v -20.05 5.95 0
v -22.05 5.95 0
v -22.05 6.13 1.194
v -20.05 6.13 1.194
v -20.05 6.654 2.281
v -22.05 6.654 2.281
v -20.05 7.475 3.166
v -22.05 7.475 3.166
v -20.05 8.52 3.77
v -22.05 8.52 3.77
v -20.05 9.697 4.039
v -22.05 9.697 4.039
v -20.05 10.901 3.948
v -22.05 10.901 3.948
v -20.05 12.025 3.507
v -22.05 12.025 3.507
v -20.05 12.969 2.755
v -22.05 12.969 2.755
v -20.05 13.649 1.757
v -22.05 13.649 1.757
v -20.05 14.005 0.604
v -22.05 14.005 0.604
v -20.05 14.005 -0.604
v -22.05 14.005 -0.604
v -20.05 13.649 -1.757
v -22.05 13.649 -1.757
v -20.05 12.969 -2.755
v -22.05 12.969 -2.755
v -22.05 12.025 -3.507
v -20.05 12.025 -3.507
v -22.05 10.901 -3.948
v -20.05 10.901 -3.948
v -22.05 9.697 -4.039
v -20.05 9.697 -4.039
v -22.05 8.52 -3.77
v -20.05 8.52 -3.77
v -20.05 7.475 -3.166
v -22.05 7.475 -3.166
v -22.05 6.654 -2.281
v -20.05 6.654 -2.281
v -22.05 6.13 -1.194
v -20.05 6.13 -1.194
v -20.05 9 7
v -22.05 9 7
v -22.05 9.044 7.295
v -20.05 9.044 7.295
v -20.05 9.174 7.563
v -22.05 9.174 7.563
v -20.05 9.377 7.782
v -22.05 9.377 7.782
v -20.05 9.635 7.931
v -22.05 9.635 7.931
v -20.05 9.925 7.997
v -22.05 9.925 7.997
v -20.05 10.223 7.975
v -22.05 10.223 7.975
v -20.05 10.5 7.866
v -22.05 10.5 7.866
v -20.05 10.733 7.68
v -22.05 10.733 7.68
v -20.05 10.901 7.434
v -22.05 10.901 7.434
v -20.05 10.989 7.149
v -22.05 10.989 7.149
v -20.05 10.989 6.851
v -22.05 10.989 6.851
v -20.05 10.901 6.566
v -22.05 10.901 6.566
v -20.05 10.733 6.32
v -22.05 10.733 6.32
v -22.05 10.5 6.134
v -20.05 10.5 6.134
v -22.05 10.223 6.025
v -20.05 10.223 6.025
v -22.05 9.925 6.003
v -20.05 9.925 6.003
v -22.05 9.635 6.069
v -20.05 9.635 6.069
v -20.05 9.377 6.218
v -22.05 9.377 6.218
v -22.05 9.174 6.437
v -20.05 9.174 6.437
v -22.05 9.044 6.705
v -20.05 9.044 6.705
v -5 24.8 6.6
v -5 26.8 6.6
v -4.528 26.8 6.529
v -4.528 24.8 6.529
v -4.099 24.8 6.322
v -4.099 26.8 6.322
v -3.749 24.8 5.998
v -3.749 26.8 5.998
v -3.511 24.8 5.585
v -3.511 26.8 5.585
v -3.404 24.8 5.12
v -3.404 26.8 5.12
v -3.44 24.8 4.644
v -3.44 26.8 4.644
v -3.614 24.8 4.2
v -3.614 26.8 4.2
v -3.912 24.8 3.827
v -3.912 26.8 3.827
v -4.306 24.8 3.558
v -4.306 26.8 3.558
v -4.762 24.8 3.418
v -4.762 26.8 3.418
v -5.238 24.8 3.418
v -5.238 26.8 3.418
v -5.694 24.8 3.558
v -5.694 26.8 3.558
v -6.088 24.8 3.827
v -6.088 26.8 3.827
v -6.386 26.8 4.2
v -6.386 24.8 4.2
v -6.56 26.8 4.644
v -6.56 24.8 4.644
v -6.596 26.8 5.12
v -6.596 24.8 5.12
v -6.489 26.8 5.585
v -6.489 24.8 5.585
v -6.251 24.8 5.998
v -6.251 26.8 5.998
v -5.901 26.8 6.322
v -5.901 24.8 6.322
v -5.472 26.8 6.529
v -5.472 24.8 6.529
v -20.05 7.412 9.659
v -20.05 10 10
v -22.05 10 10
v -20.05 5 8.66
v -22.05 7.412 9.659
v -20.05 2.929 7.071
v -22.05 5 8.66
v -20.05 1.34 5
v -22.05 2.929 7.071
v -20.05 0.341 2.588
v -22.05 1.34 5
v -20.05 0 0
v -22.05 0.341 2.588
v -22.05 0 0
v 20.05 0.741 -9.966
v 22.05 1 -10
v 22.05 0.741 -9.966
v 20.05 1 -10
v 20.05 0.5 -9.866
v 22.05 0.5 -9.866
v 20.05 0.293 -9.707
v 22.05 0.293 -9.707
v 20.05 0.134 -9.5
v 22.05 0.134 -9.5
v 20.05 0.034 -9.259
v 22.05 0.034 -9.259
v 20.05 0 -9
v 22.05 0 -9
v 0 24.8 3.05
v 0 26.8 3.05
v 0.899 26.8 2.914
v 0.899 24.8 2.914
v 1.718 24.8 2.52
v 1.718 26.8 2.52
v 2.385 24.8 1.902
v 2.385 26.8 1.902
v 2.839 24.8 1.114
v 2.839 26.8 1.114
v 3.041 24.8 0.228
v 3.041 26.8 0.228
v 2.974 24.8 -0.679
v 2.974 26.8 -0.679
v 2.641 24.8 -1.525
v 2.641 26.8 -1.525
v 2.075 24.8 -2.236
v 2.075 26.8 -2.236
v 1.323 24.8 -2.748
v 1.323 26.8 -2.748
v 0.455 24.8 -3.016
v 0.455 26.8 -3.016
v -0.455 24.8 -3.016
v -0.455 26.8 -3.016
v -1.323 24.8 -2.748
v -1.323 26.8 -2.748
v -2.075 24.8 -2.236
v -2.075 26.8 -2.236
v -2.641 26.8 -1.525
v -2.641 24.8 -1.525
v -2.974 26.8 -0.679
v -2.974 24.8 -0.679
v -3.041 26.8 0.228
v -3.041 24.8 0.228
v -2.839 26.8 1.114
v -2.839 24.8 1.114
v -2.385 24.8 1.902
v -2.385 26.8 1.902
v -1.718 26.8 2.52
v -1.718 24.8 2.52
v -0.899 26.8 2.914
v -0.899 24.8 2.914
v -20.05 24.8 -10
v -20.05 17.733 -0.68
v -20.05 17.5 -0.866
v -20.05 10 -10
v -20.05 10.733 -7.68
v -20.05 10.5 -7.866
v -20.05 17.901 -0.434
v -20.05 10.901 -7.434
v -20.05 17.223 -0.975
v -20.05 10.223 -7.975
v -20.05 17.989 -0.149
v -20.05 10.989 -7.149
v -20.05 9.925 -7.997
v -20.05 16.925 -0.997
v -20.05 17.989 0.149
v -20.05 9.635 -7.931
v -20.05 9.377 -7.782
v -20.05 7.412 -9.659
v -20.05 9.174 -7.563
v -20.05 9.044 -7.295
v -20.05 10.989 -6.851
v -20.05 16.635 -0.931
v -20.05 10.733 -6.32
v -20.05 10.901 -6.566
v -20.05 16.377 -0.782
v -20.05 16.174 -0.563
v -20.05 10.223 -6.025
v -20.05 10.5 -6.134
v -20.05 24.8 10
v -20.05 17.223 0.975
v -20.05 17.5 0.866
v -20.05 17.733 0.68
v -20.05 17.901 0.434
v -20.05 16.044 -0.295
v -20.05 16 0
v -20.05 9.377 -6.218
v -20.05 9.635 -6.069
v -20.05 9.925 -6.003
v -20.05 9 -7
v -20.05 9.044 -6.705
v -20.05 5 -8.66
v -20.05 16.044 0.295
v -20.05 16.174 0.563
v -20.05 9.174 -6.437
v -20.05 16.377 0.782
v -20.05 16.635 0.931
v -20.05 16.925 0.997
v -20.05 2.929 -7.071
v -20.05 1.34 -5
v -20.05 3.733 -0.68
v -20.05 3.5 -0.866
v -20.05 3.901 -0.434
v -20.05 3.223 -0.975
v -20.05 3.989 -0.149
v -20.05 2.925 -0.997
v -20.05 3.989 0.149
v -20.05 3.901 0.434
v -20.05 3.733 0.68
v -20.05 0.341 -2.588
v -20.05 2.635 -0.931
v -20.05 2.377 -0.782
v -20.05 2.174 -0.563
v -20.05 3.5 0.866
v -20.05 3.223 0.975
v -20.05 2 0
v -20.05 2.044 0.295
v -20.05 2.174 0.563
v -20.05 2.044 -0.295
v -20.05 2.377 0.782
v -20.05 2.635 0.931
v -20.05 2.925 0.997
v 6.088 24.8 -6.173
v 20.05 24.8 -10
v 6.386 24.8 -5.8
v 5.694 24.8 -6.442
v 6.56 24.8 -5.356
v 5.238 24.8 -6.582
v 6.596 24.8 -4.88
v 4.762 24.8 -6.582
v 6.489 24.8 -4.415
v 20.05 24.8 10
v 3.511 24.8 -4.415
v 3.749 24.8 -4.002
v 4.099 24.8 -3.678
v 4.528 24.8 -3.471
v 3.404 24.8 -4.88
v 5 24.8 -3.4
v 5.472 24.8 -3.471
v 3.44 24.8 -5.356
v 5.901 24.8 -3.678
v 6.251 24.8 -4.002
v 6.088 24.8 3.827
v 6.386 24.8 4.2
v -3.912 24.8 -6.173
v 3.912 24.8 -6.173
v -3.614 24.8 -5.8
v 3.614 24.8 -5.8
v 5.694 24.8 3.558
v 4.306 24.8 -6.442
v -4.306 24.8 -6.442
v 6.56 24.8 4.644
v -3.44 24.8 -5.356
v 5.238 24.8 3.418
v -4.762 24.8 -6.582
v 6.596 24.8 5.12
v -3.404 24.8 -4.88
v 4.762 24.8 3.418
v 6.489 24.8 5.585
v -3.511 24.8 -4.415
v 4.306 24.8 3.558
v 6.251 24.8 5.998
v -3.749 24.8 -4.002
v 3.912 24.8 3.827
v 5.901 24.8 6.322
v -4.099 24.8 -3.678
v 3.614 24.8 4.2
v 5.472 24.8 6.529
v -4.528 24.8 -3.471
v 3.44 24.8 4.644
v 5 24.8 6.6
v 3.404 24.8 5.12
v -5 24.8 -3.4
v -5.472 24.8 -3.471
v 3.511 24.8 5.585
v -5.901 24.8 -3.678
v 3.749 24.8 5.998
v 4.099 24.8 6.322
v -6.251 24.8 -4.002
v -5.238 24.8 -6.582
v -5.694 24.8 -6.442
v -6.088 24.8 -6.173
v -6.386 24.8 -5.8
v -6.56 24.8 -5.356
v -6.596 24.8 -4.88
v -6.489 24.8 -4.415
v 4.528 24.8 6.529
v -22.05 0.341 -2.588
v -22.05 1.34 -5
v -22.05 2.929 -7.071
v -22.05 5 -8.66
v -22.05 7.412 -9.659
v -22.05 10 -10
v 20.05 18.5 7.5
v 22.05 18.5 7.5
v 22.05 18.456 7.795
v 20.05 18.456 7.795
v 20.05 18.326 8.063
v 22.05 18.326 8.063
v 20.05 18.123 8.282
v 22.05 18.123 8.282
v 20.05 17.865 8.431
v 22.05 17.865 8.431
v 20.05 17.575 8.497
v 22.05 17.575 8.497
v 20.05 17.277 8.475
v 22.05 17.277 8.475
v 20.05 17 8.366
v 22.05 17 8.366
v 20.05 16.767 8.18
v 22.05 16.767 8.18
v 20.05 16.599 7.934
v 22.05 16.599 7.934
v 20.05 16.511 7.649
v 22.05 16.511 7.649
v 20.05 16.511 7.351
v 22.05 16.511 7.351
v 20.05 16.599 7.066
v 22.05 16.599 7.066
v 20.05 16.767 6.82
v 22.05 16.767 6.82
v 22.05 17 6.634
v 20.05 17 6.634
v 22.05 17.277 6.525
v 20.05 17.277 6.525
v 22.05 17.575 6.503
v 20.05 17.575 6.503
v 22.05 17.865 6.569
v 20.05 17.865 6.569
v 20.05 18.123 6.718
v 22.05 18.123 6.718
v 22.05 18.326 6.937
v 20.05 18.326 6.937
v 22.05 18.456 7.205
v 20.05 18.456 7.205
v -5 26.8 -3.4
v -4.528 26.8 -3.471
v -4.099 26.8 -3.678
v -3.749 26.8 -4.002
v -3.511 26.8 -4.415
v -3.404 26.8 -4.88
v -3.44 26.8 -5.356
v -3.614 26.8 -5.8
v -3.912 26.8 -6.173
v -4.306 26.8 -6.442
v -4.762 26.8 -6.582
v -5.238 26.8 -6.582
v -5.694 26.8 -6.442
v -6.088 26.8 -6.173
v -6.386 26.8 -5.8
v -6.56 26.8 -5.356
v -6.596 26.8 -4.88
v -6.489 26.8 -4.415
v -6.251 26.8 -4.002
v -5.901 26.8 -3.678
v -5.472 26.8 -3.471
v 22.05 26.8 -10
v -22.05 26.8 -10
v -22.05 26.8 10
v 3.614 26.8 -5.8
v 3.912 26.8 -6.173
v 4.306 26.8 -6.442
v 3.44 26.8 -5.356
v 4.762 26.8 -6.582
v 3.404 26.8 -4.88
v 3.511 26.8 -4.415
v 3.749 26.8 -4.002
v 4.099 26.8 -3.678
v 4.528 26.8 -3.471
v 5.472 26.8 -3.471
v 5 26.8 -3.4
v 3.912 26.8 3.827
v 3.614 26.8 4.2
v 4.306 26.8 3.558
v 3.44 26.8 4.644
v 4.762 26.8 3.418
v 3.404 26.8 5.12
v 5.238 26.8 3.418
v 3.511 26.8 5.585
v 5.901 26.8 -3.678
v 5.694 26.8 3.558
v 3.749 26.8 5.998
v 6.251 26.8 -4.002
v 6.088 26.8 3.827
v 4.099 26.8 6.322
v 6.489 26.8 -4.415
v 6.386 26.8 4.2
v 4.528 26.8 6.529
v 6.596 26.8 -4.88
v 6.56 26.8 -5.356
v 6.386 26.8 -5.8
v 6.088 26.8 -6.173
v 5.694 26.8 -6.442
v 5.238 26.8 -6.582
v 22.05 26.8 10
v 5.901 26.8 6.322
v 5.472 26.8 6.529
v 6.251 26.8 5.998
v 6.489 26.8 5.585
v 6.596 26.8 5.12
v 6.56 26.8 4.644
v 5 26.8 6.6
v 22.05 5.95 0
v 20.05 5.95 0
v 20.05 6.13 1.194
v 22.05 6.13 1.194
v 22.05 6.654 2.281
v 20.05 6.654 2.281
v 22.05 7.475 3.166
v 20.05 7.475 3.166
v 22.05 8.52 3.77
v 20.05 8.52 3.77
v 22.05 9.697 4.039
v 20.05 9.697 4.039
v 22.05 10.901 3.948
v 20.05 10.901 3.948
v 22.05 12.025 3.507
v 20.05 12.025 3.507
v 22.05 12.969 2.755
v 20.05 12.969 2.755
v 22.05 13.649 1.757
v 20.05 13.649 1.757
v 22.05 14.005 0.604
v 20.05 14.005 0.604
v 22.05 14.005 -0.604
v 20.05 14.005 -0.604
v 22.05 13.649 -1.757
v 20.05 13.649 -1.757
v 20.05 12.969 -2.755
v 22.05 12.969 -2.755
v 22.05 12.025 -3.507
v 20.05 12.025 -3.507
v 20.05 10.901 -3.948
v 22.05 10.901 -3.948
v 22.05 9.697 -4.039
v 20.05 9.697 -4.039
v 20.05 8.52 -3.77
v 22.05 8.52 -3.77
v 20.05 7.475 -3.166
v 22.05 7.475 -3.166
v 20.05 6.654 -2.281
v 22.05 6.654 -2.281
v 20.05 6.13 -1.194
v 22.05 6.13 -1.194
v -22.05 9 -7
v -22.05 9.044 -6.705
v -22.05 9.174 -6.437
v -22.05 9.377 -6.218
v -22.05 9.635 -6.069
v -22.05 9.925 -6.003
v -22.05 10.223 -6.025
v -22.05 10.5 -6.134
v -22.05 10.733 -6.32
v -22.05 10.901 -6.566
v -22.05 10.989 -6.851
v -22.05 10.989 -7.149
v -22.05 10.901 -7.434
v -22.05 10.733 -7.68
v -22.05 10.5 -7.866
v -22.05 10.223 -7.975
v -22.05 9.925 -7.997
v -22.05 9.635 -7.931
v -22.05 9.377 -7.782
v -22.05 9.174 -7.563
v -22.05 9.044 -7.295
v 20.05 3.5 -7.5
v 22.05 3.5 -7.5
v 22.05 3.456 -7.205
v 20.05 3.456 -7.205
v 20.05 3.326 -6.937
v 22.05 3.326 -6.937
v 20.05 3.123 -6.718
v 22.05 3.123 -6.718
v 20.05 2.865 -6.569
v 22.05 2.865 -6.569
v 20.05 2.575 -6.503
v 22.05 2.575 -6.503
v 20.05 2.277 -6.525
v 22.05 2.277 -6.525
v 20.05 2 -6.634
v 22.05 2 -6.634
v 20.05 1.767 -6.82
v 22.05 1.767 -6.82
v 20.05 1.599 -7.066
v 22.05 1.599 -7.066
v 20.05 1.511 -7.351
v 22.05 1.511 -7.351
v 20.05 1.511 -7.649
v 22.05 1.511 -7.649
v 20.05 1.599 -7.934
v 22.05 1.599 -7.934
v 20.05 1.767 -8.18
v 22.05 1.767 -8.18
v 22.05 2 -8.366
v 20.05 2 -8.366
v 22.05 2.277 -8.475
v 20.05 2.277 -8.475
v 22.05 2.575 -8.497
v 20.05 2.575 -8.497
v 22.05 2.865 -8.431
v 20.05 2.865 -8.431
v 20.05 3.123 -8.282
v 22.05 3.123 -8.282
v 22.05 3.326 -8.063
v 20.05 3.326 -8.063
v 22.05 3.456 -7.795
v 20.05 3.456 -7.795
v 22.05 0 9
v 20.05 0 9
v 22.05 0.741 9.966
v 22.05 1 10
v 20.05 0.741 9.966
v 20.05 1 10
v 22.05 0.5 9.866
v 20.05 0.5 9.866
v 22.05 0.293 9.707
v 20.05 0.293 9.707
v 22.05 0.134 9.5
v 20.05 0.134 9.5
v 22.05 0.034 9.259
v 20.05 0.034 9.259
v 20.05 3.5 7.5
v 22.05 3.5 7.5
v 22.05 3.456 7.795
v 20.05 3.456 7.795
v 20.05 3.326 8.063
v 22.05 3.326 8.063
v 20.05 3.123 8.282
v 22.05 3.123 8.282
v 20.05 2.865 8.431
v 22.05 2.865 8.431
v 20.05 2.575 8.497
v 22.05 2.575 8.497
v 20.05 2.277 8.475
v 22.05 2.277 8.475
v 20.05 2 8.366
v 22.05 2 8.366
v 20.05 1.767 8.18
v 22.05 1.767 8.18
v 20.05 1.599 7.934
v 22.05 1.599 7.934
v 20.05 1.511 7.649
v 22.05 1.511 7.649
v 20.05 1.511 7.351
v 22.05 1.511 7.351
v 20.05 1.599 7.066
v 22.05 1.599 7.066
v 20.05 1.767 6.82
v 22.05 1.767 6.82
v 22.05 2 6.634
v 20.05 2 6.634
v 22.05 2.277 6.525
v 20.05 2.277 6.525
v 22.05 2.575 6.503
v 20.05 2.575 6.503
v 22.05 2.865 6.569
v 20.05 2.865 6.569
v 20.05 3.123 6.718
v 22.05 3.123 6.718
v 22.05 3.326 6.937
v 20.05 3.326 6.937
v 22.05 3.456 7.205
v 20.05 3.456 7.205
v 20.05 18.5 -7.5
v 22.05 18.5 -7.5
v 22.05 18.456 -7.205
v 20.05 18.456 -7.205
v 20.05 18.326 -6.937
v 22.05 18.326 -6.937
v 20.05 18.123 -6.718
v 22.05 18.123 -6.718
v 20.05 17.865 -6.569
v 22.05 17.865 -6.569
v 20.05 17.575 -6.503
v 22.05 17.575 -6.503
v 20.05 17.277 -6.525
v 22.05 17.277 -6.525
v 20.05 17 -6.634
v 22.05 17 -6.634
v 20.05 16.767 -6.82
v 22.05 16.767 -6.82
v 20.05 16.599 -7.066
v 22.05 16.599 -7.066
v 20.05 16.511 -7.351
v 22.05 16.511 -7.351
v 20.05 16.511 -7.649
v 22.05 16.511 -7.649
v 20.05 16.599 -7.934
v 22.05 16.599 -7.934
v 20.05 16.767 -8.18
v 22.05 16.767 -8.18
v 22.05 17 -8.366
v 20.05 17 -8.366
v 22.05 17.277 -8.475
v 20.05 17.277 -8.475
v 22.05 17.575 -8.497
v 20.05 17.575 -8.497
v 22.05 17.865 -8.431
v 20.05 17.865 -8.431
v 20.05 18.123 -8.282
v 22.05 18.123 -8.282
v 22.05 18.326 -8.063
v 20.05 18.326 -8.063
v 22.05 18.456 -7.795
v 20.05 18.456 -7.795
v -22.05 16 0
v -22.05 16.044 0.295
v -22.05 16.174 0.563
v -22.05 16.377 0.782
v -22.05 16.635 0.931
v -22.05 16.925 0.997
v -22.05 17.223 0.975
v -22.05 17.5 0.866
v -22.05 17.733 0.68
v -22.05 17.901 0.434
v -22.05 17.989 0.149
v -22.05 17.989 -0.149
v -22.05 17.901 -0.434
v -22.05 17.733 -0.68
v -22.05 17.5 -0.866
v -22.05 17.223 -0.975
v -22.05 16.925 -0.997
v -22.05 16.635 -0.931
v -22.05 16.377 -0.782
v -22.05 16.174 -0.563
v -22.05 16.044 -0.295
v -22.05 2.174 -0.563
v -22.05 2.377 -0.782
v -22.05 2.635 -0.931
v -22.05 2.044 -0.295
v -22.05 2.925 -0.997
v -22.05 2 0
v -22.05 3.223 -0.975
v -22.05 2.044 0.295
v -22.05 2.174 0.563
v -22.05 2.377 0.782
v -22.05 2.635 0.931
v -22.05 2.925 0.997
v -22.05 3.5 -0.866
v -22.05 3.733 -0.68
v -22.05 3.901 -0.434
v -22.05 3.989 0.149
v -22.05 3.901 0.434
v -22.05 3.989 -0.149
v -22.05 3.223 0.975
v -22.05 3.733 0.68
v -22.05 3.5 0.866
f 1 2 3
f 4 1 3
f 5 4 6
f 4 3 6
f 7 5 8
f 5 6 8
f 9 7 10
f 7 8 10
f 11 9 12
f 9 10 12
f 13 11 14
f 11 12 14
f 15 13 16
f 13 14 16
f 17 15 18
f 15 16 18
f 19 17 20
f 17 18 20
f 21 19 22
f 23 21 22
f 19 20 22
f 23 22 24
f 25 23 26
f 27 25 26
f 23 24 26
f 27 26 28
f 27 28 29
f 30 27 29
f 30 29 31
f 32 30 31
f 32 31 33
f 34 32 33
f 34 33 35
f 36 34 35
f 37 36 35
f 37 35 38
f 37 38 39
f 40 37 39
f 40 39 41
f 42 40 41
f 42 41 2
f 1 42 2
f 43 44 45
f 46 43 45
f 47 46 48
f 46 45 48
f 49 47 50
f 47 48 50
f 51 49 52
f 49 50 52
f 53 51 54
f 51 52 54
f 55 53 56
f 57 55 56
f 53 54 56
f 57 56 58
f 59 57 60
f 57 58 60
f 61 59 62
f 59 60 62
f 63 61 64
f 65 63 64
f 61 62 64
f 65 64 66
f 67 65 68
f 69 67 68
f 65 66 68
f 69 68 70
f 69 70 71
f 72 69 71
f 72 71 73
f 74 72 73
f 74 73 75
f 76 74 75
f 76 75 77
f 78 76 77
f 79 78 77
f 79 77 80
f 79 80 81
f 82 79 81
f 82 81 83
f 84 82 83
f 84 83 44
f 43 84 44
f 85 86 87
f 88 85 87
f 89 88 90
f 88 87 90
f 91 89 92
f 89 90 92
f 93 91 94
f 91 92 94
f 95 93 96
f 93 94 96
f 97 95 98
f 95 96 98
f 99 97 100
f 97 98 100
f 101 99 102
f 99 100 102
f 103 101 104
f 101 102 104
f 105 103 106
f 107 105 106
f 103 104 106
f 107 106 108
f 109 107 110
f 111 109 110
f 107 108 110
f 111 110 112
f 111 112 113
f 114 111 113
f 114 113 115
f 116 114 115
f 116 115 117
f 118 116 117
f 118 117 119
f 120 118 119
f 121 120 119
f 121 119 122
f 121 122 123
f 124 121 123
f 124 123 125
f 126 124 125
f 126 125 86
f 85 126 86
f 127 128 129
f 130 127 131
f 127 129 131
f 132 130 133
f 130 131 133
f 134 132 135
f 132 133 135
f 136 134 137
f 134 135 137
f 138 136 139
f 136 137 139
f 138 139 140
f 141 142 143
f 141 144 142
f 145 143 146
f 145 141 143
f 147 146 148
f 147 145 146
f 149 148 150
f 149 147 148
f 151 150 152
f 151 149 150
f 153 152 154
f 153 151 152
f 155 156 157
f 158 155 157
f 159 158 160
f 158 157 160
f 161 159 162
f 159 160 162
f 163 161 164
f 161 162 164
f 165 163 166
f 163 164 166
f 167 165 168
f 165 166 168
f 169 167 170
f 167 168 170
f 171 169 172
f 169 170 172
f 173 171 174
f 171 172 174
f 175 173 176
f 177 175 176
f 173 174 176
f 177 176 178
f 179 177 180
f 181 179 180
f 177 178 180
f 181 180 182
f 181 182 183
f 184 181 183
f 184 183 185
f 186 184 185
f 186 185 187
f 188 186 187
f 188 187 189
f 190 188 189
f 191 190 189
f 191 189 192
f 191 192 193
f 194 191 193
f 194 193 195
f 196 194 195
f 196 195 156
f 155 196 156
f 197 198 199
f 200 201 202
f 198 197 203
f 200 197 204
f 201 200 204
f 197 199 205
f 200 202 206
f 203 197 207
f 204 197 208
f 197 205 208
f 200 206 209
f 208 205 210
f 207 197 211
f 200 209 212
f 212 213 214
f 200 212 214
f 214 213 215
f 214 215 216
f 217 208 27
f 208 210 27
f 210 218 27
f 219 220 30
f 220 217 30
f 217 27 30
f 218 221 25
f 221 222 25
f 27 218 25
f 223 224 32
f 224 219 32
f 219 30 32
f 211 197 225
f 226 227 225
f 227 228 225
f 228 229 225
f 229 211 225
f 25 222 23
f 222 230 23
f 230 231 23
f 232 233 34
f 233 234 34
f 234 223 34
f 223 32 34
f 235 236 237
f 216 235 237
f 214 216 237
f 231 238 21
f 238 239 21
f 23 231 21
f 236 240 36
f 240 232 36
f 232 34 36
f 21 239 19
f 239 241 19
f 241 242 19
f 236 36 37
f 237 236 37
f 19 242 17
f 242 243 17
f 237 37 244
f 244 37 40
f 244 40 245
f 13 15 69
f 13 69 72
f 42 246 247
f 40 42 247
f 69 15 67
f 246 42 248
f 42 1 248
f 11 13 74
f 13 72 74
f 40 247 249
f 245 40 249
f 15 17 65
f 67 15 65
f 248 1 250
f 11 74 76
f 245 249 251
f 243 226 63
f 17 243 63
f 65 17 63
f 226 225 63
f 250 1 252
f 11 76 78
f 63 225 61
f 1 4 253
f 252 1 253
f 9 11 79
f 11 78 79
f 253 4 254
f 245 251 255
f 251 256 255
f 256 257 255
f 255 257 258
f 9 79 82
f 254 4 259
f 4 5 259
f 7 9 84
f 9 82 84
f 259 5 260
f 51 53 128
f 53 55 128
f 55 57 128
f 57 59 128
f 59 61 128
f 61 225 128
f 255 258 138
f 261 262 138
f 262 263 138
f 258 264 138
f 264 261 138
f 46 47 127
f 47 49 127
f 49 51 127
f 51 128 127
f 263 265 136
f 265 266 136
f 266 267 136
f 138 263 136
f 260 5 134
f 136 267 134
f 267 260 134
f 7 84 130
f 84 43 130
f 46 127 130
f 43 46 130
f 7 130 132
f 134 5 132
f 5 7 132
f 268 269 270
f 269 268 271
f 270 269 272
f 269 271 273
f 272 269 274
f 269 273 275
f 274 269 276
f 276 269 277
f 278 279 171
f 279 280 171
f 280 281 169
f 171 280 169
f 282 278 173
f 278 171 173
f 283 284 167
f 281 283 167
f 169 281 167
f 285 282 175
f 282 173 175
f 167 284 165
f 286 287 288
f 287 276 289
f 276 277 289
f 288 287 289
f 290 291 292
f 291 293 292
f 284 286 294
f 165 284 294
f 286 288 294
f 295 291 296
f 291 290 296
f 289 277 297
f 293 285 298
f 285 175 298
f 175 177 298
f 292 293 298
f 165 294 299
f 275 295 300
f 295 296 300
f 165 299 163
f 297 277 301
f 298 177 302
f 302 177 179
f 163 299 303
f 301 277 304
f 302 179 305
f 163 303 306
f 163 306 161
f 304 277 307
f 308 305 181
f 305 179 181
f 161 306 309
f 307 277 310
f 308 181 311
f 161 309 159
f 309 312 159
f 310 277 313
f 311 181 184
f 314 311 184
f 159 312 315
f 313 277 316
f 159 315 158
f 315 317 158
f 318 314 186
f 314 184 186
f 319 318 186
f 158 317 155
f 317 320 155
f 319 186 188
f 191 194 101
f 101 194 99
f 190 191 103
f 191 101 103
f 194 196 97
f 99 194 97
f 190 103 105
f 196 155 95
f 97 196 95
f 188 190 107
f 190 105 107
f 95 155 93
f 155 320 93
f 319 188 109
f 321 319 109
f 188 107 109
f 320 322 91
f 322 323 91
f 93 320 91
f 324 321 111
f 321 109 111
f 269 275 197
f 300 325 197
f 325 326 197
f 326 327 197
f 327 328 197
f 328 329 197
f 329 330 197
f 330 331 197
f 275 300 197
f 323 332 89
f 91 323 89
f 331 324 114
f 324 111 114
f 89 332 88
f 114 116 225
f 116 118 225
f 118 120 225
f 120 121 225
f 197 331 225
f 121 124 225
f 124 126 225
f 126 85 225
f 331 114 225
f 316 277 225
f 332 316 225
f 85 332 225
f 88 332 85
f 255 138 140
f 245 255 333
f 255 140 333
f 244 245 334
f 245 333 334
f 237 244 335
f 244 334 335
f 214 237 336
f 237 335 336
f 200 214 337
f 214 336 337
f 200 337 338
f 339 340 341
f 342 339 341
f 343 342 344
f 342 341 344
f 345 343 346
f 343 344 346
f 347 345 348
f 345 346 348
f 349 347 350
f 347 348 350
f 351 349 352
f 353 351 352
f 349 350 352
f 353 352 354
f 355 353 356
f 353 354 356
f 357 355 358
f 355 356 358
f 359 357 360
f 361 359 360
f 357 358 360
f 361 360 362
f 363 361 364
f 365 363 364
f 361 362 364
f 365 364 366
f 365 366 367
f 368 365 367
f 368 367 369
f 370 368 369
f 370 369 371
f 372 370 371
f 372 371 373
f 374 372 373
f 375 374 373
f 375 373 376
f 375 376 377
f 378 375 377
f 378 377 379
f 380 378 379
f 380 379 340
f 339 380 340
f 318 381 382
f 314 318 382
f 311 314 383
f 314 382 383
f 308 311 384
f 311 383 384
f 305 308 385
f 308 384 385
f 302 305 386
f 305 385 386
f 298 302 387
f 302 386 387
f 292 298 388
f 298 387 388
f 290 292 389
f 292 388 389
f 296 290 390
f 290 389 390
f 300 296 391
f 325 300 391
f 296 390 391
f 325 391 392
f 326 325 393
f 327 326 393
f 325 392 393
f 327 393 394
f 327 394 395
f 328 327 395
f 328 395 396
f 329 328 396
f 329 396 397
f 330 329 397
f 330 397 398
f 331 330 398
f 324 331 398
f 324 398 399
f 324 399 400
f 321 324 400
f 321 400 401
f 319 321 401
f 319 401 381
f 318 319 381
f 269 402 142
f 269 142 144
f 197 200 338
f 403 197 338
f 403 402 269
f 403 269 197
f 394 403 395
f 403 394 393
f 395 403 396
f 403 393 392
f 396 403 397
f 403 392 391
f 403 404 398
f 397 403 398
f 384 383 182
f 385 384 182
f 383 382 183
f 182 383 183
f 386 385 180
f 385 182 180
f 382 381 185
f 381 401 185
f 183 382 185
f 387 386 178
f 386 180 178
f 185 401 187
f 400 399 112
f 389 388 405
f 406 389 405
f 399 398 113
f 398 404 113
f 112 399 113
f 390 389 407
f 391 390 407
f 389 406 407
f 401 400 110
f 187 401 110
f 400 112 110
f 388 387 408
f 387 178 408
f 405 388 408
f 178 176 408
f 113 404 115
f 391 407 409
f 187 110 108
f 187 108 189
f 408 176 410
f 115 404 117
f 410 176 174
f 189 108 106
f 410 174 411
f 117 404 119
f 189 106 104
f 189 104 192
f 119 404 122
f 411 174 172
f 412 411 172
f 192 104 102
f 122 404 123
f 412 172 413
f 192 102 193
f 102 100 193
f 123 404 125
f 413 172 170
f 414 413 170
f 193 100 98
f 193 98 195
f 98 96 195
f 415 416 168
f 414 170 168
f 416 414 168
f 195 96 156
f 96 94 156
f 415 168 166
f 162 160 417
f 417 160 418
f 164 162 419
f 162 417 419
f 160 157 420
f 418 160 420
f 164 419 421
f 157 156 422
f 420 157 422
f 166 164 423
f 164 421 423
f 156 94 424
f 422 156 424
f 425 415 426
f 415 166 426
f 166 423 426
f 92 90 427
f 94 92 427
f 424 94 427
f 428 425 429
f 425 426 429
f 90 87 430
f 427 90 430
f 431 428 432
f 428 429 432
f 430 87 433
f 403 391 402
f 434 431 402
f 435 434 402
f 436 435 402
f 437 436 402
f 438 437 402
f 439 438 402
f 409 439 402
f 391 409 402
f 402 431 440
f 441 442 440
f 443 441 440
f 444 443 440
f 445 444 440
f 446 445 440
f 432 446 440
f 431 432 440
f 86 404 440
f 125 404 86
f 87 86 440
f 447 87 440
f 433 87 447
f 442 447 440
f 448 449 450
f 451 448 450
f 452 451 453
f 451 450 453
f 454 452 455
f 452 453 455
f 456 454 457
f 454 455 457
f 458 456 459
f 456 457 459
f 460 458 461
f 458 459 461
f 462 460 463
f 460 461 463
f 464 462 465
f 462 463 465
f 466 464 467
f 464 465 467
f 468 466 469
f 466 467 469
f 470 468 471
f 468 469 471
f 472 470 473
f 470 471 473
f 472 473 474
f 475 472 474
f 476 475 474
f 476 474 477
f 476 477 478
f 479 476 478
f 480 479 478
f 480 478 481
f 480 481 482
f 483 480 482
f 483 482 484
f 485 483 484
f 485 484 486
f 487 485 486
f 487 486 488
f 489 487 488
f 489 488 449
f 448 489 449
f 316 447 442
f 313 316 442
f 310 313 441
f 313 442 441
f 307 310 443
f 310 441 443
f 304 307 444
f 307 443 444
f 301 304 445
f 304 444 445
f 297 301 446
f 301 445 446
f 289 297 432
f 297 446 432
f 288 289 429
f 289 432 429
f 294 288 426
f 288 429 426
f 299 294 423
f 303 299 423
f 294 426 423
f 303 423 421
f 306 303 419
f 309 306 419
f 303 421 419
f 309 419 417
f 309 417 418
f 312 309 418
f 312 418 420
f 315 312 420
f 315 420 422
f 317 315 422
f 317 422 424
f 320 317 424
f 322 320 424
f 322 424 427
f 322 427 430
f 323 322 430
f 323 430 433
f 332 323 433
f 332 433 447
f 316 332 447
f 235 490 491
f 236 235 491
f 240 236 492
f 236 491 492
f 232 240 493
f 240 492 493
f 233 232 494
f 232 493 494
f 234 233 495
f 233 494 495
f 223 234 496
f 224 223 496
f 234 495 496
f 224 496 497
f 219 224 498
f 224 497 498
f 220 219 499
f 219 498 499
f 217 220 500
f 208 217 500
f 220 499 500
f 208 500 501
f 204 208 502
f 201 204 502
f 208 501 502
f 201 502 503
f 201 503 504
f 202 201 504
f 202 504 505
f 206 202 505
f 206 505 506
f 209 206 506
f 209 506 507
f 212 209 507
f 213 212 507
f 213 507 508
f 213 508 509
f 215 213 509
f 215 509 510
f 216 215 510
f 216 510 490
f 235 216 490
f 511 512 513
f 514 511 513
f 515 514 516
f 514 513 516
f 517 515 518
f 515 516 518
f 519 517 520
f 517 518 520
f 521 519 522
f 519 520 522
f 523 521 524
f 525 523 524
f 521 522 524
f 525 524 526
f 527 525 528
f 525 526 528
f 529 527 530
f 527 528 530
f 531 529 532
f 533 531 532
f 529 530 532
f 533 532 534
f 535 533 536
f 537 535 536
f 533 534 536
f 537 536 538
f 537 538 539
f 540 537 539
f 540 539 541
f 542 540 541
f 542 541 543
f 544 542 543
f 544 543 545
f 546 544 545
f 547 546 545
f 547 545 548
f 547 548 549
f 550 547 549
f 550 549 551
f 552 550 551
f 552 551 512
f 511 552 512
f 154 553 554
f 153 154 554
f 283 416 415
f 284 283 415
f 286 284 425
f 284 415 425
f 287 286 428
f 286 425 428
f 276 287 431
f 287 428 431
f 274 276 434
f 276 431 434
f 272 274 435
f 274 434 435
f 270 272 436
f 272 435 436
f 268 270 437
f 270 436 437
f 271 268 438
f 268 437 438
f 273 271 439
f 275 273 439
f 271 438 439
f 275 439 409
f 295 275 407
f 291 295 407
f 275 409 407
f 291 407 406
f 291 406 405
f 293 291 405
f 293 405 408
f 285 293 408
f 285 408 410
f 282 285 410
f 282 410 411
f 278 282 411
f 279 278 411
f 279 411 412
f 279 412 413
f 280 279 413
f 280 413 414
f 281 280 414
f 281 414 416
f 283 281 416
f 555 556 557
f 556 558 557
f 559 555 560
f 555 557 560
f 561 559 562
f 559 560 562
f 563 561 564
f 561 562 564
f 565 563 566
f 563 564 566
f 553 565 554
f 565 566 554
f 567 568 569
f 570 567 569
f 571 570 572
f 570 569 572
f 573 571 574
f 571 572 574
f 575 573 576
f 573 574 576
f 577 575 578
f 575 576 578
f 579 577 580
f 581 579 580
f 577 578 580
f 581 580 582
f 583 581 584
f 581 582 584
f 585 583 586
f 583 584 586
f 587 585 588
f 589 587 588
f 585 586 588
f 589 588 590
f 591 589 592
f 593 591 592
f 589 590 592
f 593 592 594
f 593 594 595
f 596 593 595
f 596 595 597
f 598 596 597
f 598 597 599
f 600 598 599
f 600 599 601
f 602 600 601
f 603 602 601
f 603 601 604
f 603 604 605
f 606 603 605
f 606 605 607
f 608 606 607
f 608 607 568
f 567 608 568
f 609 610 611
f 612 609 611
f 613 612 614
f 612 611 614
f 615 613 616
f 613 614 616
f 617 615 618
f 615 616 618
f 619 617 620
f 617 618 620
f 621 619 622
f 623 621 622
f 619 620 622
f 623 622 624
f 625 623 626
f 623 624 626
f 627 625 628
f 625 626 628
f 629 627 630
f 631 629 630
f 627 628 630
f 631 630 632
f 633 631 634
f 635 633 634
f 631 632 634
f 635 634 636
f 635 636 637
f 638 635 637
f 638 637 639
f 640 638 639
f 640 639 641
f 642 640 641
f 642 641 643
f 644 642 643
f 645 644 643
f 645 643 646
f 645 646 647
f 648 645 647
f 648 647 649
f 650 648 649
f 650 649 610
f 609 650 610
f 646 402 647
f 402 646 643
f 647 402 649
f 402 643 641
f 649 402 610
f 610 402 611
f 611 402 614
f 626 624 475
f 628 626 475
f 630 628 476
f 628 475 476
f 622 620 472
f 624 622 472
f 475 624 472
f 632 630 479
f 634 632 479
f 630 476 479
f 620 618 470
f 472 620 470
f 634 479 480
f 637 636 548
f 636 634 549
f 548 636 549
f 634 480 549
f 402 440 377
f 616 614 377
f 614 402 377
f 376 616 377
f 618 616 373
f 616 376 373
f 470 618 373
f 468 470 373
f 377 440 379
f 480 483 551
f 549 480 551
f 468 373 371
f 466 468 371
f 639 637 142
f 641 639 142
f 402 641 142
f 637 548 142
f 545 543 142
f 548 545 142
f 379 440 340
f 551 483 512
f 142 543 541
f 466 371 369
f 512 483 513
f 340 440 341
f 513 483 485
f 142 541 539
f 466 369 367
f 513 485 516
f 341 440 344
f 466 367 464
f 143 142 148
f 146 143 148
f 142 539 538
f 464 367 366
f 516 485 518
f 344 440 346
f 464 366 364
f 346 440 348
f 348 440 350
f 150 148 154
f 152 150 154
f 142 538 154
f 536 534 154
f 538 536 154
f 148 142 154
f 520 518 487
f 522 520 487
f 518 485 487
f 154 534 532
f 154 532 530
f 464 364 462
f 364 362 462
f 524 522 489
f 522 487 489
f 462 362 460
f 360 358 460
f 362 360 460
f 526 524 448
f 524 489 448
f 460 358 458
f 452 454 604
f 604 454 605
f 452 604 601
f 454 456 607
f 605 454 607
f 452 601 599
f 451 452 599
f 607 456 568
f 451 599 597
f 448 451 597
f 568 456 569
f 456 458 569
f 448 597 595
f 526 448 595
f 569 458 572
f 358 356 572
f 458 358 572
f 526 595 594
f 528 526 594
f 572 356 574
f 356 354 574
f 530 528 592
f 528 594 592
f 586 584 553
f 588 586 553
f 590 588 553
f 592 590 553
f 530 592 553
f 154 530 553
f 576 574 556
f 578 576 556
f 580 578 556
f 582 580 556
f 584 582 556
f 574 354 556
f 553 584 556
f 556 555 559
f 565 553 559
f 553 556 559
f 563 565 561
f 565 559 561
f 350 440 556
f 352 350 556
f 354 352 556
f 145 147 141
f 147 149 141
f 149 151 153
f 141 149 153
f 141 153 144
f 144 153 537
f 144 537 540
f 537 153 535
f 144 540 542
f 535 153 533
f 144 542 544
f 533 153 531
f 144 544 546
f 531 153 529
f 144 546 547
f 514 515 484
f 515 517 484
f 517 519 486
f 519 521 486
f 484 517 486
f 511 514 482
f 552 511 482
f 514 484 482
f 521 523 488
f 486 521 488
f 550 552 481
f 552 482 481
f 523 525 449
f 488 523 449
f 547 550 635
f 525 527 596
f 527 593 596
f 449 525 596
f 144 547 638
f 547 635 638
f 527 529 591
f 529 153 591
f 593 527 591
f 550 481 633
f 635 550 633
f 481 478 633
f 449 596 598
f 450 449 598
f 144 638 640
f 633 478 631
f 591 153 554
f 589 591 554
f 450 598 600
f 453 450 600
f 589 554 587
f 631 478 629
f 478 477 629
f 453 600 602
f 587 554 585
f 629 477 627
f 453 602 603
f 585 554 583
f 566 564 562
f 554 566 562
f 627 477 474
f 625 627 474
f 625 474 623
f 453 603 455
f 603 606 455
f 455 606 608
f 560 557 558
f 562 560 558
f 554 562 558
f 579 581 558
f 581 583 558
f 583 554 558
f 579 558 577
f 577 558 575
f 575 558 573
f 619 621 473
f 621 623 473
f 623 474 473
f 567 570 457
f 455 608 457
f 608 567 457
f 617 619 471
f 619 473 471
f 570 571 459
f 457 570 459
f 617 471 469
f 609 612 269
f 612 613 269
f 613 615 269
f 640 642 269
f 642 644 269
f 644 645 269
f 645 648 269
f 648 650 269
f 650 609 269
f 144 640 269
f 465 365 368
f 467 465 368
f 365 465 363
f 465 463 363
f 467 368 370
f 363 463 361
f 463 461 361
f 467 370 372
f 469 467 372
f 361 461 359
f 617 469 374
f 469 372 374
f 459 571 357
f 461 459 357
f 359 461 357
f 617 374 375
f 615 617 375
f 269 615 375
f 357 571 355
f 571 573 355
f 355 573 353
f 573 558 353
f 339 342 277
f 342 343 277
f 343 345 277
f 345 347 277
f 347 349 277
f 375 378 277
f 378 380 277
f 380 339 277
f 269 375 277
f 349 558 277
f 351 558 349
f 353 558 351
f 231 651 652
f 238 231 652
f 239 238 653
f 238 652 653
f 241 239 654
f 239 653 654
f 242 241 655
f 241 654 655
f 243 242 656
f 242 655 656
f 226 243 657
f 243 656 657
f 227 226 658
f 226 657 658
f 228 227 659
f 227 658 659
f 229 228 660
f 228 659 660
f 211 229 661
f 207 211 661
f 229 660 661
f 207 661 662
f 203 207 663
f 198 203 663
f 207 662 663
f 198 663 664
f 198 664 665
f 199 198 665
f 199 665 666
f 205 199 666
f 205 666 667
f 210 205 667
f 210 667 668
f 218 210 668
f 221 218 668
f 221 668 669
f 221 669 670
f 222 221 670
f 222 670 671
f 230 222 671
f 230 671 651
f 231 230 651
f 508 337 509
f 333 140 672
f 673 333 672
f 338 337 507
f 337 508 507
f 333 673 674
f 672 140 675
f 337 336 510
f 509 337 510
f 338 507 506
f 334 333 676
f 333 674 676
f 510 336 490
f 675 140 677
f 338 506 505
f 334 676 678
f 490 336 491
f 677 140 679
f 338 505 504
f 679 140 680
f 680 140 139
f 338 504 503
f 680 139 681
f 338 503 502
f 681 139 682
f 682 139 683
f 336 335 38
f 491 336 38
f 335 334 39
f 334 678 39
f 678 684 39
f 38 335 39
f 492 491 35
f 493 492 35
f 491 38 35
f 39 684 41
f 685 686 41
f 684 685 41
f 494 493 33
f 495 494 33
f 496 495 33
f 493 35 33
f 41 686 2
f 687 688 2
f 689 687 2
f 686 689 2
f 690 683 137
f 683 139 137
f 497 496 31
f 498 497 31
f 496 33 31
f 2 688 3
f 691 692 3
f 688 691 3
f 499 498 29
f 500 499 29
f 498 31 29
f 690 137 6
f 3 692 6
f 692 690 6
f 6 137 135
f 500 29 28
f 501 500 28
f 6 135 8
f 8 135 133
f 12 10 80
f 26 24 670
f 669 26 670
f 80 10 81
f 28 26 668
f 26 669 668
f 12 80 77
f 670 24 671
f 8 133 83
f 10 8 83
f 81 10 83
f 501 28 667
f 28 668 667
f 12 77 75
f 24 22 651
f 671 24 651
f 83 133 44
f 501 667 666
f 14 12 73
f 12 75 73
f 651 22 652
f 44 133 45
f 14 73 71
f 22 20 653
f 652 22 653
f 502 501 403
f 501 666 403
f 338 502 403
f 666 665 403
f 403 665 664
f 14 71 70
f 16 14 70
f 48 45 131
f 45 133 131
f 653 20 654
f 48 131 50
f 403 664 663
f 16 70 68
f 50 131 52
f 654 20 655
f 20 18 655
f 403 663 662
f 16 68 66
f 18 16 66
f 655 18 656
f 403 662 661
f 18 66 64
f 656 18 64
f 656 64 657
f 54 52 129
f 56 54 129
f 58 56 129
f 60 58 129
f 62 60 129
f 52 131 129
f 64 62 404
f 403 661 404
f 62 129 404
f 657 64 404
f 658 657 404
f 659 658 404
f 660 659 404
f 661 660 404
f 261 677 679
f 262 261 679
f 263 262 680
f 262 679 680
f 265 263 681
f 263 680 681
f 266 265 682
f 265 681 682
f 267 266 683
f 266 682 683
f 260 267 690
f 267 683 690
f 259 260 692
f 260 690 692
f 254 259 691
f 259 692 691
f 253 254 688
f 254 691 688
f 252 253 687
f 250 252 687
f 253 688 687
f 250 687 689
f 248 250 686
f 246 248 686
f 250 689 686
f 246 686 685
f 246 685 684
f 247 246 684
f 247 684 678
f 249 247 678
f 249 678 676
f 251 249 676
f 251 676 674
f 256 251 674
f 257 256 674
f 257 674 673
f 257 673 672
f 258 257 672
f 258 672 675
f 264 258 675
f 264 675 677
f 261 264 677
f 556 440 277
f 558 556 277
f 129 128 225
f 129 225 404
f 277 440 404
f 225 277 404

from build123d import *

# Parameters (mm, degrees)
BOSS_EXTRU_1_DEPTH                  = 10
ESQUISSE6_R                         = 3.05
ESQUISSE6_R_2                       = 1.6
ENL_V_MAT_EXTRU_4_DEPTH             = 37.117066603
ENL_V_MAT_EXTRU_1_REACH             = 54.565
ENL_V_MAT_EXTRU_1_DIRECTION_2_DEPTH = 53.56472201
ESQUISSE4_R                         = 4.05
ENL_V_MAT_EXTRU_2_DEPTH             = 53.56472201
ENL_V_MAT_EXTRU_3_REACH             = 54.565
ESQUISSE5_R                         = 1
ENL_V_MAT_EXTRU_5_REACH             = 54.565
ESQUISSE7_R                         = 1
CONG_1_R                            = 1


with BuildPart() as part:
    # Esquisse1 → Boss.-Extru.1 (new, symmetric)
    with BuildSketch(Plane.XY):
        Polygon((-22.05, 26.8), (22.05, 26.8), (22.05, 0), (20.05, 0), (20.05, 24.8), (-20.05, 24.8), (-20.05, 0), (-22.05, 0), align=None)
    extrude(amount=BOSS_EXTRU_1_DEPTH, both=True)

    # Esquisse6 → Enlèv. mat.-Extru.4 (cut, through all)
    with BuildSketch(Plane(origin=(0, 26.8, 0), x_dir=(1, 0, 0), z_dir=(0, 1, 0))):
        with Locations(Location((0, 0, 0), (0, 0, 270))):
            Circle(ESQUISSE6_R)
        with Locations(Location((-5, 5, 0), (0, 0, 270))):
            Circle(ESQUISSE6_R_2)
        with Locations(Location((5, 5, 0), (0, 0, 270))):
            Circle(ESQUISSE6_R_2)
        with Locations(Location((5, -5, 0), (0, 0, 270))):
            Circle(ESQUISSE6_R_2)
        with Locations(Location((-5, -5, 0), (0, 0, 270))):
            Circle(ESQUISSE6_R_2)
    extrude(amount=-ENL_V_MAT_EXTRU_4_DEPTH, mode=Mode.SUBTRACT)

    # Esquisse3 → Enlèv. mat.-Extru.1 (cut, up to next)
    with BuildSketch(Plane.ZY.offset(22.05), mode=Mode.PRIVATE) as enl_v_mat_extru_1_sk1:
        with BuildLine():
            ThreePointArc((0, 0), (-7.071067812, 2.928932188), (-10, 10))
            Line((-10, 10), (-10, 0))
            Line((-10, 0), (0, 0))
        make_face()
    enl_v_mat_extru_1_tool1 = extrude(enl_v_mat_extru_1_sk1.sketch, amount=-ENL_V_MAT_EXTRU_1_REACH, mode=Mode.PRIVATE) & part.part
    # Esquisse3 → Enlèv. mat.-Extru.1 (cut, up to next)
    with BuildSketch(Plane.ZY.offset(22.05), mode=Mode.PRIVATE) as enl_v_mat_extru_1_sk2:
        with BuildLine():
            ThreePointArc((10, 10), (7.071067812, 2.928932188), (0, 0))
            Line((0, 0), (10, 0))
            Line((10, 0), (10, 10))
        make_face()
    enl_v_mat_extru_1_tool2 = extrude(enl_v_mat_extru_1_sk2.sketch, amount=-ENL_V_MAT_EXTRU_1_REACH, mode=Mode.PRIVATE) & part.part
    add(enl_v_mat_extru_1_tool1.solids().sort_by_distance((-22.05, 2.233679, -7.766321))[0], mode=Mode.SUBTRACT)
    add(enl_v_mat_extru_1_tool2.solids().sort_by_distance((-22.05, 2.233679, 7.766321))[0], mode=Mode.SUBTRACT)

    # Esquisse3 → Enlèv. mat.-Extru.1 direction 2 (cut)
    with BuildSketch(Plane.ZY.offset(22.05)):
        with BuildLine():
            ThreePointArc((0, 0), (-7.071067812, 2.928932188), (-10, 10))
            Line((-10, 10), (-10, 0))
            Line((-10, 0), (0, 0))
        make_face()
        with BuildLine():
            ThreePointArc((10, 10), (7.071067812, 2.928932188), (0, 0))
            Line((0, 0), (10, 0))
            Line((10, 0), (10, 10))
        make_face()
    extrude(amount=ENL_V_MAT_EXTRU_1_DIRECTION_2_DEPTH, mode=Mode.SUBTRACT)

    # Esquisse4 → Enlèv. mat.-Extru.2 (cut, through all)
    with BuildSketch(Plane.ZY.offset(22.05)):
        with Locations(Location((0, 10, 0), (0, 0, 270))):
            Circle(ESQUISSE4_R)
    extrude(amount=-ENL_V_MAT_EXTRU_2_DEPTH, mode=Mode.SUBTRACT)

    # Esquisse5 → Enlèv. mat.-Extru.3 (cut, up to next)
    with BuildSketch(Plane.ZY.offset(22.05), mode=Mode.PRIVATE) as enl_v_mat_extru_3_sk1:
        with Locations(Location((-7, 10, 0), (0, 0, 270))):
            Circle(ESQUISSE5_R)
    enl_v_mat_extru_3_tool1 = extrude(enl_v_mat_extru_3_sk1.sketch, amount=-ENL_V_MAT_EXTRU_3_REACH, mode=Mode.PRIVATE) & part.part
    # Esquisse5 → Enlèv. mat.-Extru.3 (cut, up to next)
    with BuildSketch(Plane.ZY.offset(22.05), mode=Mode.PRIVATE) as enl_v_mat_extru_3_sk2:
        with Locations(Location((0, 17, 0), (0, 0, 270))):
            Circle(ESQUISSE5_R)
    enl_v_mat_extru_3_tool2 = extrude(enl_v_mat_extru_3_sk2.sketch, amount=-ENL_V_MAT_EXTRU_3_REACH, mode=Mode.PRIVATE) & part.part
    # Esquisse5 → Enlèv. mat.-Extru.3 (cut, up to next)
    with BuildSketch(Plane.ZY.offset(22.05), mode=Mode.PRIVATE) as enl_v_mat_extru_3_sk3:
        with Locations(Location((7, 10, 0), (0, 0, 270))):
            Circle(ESQUISSE5_R)
    enl_v_mat_extru_3_tool3 = extrude(enl_v_mat_extru_3_sk3.sketch, amount=-ENL_V_MAT_EXTRU_3_REACH, mode=Mode.PRIVATE) & part.part
    # Esquisse5 → Enlèv. mat.-Extru.3 (cut, up to next)
    with BuildSketch(Plane.ZY.offset(22.05), mode=Mode.PRIVATE) as enl_v_mat_extru_3_sk4:
        with Locations(Location((0, 3, 0), (0, 0, 270))):
            Circle(ESQUISSE5_R)
    enl_v_mat_extru_3_tool4 = extrude(enl_v_mat_extru_3_sk4.sketch, amount=-ENL_V_MAT_EXTRU_3_REACH, mode=Mode.PRIVATE) & part.part
    add(enl_v_mat_extru_3_tool1.solids().sort_by_distance((-22.05, 10, -7))[0], mode=Mode.SUBTRACT)
    add(enl_v_mat_extru_3_tool2.solids().sort_by_distance((-22.05, 17, 0))[0], mode=Mode.SUBTRACT)
    add(enl_v_mat_extru_3_tool3.solids().sort_by_distance((-22.05, 10, 7))[0], mode=Mode.SUBTRACT)
    add(enl_v_mat_extru_3_tool4.solids().sort_by_distance((-22.05, 3, 0))[0], mode=Mode.SUBTRACT)

    # Esquisse7 → Enlèv. mat.-Extru.5 (cut, up to next)
    with BuildSketch(Plane(origin=(22.05, 0, 0), x_dir=(0, 0, -1), z_dir=(1, 0, 0)), mode=Mode.PRIVATE) as enl_v_mat_extru_5_sk1:
        with Locations(Location((-7.5, 2.5, 0), (0, 0, 90))):
            Circle(ESQUISSE7_R)
    enl_v_mat_extru_5_tool1 = extrude(enl_v_mat_extru_5_sk1.sketch, amount=-ENL_V_MAT_EXTRU_5_REACH, mode=Mode.PRIVATE) & part.part
    # Esquisse7 → Enlèv. mat.-Extru.5 (cut, up to next)
    with BuildSketch(Plane(origin=(22.05, 0, 0), x_dir=(0, 0, -1), z_dir=(1, 0, 0)), mode=Mode.PRIVATE) as enl_v_mat_extru_5_sk2:
        with Locations(Location((7.5, 2.5, 0), (0, 0, 90))):
            Circle(ESQUISSE7_R)
    enl_v_mat_extru_5_tool2 = extrude(enl_v_mat_extru_5_sk2.sketch, amount=-ENL_V_MAT_EXTRU_5_REACH, mode=Mode.PRIVATE) & part.part
    # Esquisse7 → Enlèv. mat.-Extru.5 (cut, up to next)
    with BuildSketch(Plane(origin=(22.05, 0, 0), x_dir=(0, 0, -1), z_dir=(1, 0, 0)), mode=Mode.PRIVATE) as enl_v_mat_extru_5_sk3:
        with Locations(Location((7.5, 17.5, 0), (0, 0, 90))):
            Circle(ESQUISSE7_R)
    enl_v_mat_extru_5_tool3 = extrude(enl_v_mat_extru_5_sk3.sketch, amount=-ENL_V_MAT_EXTRU_5_REACH, mode=Mode.PRIVATE) & part.part
    # Esquisse7 → Enlèv. mat.-Extru.5 (cut, up to next)
    with BuildSketch(Plane(origin=(22.05, 0, 0), x_dir=(0, 0, -1), z_dir=(1, 0, 0)), mode=Mode.PRIVATE) as enl_v_mat_extru_5_sk4:
        with Locations(Location((-7.5, 17.5, 0), (0, 0, 90))):
            Circle(ESQUISSE7_R)
    enl_v_mat_extru_5_tool4 = extrude(enl_v_mat_extru_5_sk4.sketch, amount=-ENL_V_MAT_EXTRU_5_REACH, mode=Mode.PRIVATE) & part.part
    add(enl_v_mat_extru_5_tool1.solids().sort_by_distance((22.05, 2.5, 7.5))[0], mode=Mode.SUBTRACT)
    add(enl_v_mat_extru_5_tool2.solids().sort_by_distance((22.05, 2.5, -7.5))[0], mode=Mode.SUBTRACT)
    add(enl_v_mat_extru_5_tool3.solids().sort_by_distance((22.05, 17.5, -7.5))[0], mode=Mode.SUBTRACT)
    add(enl_v_mat_extru_5_tool4.solids().sort_by_distance((22.05, 17.5, 7.5))[0], mode=Mode.SUBTRACT)

    # Congé1
    cong_1_edges = [part.edges().sort_by_distance(p)[0] for p in [
        (21.05, 0, 10),
        (21.05, 0, -10),
    ]]
    fillet(cong_1_edges, radius=CONG_1_R)


solid = part.part
